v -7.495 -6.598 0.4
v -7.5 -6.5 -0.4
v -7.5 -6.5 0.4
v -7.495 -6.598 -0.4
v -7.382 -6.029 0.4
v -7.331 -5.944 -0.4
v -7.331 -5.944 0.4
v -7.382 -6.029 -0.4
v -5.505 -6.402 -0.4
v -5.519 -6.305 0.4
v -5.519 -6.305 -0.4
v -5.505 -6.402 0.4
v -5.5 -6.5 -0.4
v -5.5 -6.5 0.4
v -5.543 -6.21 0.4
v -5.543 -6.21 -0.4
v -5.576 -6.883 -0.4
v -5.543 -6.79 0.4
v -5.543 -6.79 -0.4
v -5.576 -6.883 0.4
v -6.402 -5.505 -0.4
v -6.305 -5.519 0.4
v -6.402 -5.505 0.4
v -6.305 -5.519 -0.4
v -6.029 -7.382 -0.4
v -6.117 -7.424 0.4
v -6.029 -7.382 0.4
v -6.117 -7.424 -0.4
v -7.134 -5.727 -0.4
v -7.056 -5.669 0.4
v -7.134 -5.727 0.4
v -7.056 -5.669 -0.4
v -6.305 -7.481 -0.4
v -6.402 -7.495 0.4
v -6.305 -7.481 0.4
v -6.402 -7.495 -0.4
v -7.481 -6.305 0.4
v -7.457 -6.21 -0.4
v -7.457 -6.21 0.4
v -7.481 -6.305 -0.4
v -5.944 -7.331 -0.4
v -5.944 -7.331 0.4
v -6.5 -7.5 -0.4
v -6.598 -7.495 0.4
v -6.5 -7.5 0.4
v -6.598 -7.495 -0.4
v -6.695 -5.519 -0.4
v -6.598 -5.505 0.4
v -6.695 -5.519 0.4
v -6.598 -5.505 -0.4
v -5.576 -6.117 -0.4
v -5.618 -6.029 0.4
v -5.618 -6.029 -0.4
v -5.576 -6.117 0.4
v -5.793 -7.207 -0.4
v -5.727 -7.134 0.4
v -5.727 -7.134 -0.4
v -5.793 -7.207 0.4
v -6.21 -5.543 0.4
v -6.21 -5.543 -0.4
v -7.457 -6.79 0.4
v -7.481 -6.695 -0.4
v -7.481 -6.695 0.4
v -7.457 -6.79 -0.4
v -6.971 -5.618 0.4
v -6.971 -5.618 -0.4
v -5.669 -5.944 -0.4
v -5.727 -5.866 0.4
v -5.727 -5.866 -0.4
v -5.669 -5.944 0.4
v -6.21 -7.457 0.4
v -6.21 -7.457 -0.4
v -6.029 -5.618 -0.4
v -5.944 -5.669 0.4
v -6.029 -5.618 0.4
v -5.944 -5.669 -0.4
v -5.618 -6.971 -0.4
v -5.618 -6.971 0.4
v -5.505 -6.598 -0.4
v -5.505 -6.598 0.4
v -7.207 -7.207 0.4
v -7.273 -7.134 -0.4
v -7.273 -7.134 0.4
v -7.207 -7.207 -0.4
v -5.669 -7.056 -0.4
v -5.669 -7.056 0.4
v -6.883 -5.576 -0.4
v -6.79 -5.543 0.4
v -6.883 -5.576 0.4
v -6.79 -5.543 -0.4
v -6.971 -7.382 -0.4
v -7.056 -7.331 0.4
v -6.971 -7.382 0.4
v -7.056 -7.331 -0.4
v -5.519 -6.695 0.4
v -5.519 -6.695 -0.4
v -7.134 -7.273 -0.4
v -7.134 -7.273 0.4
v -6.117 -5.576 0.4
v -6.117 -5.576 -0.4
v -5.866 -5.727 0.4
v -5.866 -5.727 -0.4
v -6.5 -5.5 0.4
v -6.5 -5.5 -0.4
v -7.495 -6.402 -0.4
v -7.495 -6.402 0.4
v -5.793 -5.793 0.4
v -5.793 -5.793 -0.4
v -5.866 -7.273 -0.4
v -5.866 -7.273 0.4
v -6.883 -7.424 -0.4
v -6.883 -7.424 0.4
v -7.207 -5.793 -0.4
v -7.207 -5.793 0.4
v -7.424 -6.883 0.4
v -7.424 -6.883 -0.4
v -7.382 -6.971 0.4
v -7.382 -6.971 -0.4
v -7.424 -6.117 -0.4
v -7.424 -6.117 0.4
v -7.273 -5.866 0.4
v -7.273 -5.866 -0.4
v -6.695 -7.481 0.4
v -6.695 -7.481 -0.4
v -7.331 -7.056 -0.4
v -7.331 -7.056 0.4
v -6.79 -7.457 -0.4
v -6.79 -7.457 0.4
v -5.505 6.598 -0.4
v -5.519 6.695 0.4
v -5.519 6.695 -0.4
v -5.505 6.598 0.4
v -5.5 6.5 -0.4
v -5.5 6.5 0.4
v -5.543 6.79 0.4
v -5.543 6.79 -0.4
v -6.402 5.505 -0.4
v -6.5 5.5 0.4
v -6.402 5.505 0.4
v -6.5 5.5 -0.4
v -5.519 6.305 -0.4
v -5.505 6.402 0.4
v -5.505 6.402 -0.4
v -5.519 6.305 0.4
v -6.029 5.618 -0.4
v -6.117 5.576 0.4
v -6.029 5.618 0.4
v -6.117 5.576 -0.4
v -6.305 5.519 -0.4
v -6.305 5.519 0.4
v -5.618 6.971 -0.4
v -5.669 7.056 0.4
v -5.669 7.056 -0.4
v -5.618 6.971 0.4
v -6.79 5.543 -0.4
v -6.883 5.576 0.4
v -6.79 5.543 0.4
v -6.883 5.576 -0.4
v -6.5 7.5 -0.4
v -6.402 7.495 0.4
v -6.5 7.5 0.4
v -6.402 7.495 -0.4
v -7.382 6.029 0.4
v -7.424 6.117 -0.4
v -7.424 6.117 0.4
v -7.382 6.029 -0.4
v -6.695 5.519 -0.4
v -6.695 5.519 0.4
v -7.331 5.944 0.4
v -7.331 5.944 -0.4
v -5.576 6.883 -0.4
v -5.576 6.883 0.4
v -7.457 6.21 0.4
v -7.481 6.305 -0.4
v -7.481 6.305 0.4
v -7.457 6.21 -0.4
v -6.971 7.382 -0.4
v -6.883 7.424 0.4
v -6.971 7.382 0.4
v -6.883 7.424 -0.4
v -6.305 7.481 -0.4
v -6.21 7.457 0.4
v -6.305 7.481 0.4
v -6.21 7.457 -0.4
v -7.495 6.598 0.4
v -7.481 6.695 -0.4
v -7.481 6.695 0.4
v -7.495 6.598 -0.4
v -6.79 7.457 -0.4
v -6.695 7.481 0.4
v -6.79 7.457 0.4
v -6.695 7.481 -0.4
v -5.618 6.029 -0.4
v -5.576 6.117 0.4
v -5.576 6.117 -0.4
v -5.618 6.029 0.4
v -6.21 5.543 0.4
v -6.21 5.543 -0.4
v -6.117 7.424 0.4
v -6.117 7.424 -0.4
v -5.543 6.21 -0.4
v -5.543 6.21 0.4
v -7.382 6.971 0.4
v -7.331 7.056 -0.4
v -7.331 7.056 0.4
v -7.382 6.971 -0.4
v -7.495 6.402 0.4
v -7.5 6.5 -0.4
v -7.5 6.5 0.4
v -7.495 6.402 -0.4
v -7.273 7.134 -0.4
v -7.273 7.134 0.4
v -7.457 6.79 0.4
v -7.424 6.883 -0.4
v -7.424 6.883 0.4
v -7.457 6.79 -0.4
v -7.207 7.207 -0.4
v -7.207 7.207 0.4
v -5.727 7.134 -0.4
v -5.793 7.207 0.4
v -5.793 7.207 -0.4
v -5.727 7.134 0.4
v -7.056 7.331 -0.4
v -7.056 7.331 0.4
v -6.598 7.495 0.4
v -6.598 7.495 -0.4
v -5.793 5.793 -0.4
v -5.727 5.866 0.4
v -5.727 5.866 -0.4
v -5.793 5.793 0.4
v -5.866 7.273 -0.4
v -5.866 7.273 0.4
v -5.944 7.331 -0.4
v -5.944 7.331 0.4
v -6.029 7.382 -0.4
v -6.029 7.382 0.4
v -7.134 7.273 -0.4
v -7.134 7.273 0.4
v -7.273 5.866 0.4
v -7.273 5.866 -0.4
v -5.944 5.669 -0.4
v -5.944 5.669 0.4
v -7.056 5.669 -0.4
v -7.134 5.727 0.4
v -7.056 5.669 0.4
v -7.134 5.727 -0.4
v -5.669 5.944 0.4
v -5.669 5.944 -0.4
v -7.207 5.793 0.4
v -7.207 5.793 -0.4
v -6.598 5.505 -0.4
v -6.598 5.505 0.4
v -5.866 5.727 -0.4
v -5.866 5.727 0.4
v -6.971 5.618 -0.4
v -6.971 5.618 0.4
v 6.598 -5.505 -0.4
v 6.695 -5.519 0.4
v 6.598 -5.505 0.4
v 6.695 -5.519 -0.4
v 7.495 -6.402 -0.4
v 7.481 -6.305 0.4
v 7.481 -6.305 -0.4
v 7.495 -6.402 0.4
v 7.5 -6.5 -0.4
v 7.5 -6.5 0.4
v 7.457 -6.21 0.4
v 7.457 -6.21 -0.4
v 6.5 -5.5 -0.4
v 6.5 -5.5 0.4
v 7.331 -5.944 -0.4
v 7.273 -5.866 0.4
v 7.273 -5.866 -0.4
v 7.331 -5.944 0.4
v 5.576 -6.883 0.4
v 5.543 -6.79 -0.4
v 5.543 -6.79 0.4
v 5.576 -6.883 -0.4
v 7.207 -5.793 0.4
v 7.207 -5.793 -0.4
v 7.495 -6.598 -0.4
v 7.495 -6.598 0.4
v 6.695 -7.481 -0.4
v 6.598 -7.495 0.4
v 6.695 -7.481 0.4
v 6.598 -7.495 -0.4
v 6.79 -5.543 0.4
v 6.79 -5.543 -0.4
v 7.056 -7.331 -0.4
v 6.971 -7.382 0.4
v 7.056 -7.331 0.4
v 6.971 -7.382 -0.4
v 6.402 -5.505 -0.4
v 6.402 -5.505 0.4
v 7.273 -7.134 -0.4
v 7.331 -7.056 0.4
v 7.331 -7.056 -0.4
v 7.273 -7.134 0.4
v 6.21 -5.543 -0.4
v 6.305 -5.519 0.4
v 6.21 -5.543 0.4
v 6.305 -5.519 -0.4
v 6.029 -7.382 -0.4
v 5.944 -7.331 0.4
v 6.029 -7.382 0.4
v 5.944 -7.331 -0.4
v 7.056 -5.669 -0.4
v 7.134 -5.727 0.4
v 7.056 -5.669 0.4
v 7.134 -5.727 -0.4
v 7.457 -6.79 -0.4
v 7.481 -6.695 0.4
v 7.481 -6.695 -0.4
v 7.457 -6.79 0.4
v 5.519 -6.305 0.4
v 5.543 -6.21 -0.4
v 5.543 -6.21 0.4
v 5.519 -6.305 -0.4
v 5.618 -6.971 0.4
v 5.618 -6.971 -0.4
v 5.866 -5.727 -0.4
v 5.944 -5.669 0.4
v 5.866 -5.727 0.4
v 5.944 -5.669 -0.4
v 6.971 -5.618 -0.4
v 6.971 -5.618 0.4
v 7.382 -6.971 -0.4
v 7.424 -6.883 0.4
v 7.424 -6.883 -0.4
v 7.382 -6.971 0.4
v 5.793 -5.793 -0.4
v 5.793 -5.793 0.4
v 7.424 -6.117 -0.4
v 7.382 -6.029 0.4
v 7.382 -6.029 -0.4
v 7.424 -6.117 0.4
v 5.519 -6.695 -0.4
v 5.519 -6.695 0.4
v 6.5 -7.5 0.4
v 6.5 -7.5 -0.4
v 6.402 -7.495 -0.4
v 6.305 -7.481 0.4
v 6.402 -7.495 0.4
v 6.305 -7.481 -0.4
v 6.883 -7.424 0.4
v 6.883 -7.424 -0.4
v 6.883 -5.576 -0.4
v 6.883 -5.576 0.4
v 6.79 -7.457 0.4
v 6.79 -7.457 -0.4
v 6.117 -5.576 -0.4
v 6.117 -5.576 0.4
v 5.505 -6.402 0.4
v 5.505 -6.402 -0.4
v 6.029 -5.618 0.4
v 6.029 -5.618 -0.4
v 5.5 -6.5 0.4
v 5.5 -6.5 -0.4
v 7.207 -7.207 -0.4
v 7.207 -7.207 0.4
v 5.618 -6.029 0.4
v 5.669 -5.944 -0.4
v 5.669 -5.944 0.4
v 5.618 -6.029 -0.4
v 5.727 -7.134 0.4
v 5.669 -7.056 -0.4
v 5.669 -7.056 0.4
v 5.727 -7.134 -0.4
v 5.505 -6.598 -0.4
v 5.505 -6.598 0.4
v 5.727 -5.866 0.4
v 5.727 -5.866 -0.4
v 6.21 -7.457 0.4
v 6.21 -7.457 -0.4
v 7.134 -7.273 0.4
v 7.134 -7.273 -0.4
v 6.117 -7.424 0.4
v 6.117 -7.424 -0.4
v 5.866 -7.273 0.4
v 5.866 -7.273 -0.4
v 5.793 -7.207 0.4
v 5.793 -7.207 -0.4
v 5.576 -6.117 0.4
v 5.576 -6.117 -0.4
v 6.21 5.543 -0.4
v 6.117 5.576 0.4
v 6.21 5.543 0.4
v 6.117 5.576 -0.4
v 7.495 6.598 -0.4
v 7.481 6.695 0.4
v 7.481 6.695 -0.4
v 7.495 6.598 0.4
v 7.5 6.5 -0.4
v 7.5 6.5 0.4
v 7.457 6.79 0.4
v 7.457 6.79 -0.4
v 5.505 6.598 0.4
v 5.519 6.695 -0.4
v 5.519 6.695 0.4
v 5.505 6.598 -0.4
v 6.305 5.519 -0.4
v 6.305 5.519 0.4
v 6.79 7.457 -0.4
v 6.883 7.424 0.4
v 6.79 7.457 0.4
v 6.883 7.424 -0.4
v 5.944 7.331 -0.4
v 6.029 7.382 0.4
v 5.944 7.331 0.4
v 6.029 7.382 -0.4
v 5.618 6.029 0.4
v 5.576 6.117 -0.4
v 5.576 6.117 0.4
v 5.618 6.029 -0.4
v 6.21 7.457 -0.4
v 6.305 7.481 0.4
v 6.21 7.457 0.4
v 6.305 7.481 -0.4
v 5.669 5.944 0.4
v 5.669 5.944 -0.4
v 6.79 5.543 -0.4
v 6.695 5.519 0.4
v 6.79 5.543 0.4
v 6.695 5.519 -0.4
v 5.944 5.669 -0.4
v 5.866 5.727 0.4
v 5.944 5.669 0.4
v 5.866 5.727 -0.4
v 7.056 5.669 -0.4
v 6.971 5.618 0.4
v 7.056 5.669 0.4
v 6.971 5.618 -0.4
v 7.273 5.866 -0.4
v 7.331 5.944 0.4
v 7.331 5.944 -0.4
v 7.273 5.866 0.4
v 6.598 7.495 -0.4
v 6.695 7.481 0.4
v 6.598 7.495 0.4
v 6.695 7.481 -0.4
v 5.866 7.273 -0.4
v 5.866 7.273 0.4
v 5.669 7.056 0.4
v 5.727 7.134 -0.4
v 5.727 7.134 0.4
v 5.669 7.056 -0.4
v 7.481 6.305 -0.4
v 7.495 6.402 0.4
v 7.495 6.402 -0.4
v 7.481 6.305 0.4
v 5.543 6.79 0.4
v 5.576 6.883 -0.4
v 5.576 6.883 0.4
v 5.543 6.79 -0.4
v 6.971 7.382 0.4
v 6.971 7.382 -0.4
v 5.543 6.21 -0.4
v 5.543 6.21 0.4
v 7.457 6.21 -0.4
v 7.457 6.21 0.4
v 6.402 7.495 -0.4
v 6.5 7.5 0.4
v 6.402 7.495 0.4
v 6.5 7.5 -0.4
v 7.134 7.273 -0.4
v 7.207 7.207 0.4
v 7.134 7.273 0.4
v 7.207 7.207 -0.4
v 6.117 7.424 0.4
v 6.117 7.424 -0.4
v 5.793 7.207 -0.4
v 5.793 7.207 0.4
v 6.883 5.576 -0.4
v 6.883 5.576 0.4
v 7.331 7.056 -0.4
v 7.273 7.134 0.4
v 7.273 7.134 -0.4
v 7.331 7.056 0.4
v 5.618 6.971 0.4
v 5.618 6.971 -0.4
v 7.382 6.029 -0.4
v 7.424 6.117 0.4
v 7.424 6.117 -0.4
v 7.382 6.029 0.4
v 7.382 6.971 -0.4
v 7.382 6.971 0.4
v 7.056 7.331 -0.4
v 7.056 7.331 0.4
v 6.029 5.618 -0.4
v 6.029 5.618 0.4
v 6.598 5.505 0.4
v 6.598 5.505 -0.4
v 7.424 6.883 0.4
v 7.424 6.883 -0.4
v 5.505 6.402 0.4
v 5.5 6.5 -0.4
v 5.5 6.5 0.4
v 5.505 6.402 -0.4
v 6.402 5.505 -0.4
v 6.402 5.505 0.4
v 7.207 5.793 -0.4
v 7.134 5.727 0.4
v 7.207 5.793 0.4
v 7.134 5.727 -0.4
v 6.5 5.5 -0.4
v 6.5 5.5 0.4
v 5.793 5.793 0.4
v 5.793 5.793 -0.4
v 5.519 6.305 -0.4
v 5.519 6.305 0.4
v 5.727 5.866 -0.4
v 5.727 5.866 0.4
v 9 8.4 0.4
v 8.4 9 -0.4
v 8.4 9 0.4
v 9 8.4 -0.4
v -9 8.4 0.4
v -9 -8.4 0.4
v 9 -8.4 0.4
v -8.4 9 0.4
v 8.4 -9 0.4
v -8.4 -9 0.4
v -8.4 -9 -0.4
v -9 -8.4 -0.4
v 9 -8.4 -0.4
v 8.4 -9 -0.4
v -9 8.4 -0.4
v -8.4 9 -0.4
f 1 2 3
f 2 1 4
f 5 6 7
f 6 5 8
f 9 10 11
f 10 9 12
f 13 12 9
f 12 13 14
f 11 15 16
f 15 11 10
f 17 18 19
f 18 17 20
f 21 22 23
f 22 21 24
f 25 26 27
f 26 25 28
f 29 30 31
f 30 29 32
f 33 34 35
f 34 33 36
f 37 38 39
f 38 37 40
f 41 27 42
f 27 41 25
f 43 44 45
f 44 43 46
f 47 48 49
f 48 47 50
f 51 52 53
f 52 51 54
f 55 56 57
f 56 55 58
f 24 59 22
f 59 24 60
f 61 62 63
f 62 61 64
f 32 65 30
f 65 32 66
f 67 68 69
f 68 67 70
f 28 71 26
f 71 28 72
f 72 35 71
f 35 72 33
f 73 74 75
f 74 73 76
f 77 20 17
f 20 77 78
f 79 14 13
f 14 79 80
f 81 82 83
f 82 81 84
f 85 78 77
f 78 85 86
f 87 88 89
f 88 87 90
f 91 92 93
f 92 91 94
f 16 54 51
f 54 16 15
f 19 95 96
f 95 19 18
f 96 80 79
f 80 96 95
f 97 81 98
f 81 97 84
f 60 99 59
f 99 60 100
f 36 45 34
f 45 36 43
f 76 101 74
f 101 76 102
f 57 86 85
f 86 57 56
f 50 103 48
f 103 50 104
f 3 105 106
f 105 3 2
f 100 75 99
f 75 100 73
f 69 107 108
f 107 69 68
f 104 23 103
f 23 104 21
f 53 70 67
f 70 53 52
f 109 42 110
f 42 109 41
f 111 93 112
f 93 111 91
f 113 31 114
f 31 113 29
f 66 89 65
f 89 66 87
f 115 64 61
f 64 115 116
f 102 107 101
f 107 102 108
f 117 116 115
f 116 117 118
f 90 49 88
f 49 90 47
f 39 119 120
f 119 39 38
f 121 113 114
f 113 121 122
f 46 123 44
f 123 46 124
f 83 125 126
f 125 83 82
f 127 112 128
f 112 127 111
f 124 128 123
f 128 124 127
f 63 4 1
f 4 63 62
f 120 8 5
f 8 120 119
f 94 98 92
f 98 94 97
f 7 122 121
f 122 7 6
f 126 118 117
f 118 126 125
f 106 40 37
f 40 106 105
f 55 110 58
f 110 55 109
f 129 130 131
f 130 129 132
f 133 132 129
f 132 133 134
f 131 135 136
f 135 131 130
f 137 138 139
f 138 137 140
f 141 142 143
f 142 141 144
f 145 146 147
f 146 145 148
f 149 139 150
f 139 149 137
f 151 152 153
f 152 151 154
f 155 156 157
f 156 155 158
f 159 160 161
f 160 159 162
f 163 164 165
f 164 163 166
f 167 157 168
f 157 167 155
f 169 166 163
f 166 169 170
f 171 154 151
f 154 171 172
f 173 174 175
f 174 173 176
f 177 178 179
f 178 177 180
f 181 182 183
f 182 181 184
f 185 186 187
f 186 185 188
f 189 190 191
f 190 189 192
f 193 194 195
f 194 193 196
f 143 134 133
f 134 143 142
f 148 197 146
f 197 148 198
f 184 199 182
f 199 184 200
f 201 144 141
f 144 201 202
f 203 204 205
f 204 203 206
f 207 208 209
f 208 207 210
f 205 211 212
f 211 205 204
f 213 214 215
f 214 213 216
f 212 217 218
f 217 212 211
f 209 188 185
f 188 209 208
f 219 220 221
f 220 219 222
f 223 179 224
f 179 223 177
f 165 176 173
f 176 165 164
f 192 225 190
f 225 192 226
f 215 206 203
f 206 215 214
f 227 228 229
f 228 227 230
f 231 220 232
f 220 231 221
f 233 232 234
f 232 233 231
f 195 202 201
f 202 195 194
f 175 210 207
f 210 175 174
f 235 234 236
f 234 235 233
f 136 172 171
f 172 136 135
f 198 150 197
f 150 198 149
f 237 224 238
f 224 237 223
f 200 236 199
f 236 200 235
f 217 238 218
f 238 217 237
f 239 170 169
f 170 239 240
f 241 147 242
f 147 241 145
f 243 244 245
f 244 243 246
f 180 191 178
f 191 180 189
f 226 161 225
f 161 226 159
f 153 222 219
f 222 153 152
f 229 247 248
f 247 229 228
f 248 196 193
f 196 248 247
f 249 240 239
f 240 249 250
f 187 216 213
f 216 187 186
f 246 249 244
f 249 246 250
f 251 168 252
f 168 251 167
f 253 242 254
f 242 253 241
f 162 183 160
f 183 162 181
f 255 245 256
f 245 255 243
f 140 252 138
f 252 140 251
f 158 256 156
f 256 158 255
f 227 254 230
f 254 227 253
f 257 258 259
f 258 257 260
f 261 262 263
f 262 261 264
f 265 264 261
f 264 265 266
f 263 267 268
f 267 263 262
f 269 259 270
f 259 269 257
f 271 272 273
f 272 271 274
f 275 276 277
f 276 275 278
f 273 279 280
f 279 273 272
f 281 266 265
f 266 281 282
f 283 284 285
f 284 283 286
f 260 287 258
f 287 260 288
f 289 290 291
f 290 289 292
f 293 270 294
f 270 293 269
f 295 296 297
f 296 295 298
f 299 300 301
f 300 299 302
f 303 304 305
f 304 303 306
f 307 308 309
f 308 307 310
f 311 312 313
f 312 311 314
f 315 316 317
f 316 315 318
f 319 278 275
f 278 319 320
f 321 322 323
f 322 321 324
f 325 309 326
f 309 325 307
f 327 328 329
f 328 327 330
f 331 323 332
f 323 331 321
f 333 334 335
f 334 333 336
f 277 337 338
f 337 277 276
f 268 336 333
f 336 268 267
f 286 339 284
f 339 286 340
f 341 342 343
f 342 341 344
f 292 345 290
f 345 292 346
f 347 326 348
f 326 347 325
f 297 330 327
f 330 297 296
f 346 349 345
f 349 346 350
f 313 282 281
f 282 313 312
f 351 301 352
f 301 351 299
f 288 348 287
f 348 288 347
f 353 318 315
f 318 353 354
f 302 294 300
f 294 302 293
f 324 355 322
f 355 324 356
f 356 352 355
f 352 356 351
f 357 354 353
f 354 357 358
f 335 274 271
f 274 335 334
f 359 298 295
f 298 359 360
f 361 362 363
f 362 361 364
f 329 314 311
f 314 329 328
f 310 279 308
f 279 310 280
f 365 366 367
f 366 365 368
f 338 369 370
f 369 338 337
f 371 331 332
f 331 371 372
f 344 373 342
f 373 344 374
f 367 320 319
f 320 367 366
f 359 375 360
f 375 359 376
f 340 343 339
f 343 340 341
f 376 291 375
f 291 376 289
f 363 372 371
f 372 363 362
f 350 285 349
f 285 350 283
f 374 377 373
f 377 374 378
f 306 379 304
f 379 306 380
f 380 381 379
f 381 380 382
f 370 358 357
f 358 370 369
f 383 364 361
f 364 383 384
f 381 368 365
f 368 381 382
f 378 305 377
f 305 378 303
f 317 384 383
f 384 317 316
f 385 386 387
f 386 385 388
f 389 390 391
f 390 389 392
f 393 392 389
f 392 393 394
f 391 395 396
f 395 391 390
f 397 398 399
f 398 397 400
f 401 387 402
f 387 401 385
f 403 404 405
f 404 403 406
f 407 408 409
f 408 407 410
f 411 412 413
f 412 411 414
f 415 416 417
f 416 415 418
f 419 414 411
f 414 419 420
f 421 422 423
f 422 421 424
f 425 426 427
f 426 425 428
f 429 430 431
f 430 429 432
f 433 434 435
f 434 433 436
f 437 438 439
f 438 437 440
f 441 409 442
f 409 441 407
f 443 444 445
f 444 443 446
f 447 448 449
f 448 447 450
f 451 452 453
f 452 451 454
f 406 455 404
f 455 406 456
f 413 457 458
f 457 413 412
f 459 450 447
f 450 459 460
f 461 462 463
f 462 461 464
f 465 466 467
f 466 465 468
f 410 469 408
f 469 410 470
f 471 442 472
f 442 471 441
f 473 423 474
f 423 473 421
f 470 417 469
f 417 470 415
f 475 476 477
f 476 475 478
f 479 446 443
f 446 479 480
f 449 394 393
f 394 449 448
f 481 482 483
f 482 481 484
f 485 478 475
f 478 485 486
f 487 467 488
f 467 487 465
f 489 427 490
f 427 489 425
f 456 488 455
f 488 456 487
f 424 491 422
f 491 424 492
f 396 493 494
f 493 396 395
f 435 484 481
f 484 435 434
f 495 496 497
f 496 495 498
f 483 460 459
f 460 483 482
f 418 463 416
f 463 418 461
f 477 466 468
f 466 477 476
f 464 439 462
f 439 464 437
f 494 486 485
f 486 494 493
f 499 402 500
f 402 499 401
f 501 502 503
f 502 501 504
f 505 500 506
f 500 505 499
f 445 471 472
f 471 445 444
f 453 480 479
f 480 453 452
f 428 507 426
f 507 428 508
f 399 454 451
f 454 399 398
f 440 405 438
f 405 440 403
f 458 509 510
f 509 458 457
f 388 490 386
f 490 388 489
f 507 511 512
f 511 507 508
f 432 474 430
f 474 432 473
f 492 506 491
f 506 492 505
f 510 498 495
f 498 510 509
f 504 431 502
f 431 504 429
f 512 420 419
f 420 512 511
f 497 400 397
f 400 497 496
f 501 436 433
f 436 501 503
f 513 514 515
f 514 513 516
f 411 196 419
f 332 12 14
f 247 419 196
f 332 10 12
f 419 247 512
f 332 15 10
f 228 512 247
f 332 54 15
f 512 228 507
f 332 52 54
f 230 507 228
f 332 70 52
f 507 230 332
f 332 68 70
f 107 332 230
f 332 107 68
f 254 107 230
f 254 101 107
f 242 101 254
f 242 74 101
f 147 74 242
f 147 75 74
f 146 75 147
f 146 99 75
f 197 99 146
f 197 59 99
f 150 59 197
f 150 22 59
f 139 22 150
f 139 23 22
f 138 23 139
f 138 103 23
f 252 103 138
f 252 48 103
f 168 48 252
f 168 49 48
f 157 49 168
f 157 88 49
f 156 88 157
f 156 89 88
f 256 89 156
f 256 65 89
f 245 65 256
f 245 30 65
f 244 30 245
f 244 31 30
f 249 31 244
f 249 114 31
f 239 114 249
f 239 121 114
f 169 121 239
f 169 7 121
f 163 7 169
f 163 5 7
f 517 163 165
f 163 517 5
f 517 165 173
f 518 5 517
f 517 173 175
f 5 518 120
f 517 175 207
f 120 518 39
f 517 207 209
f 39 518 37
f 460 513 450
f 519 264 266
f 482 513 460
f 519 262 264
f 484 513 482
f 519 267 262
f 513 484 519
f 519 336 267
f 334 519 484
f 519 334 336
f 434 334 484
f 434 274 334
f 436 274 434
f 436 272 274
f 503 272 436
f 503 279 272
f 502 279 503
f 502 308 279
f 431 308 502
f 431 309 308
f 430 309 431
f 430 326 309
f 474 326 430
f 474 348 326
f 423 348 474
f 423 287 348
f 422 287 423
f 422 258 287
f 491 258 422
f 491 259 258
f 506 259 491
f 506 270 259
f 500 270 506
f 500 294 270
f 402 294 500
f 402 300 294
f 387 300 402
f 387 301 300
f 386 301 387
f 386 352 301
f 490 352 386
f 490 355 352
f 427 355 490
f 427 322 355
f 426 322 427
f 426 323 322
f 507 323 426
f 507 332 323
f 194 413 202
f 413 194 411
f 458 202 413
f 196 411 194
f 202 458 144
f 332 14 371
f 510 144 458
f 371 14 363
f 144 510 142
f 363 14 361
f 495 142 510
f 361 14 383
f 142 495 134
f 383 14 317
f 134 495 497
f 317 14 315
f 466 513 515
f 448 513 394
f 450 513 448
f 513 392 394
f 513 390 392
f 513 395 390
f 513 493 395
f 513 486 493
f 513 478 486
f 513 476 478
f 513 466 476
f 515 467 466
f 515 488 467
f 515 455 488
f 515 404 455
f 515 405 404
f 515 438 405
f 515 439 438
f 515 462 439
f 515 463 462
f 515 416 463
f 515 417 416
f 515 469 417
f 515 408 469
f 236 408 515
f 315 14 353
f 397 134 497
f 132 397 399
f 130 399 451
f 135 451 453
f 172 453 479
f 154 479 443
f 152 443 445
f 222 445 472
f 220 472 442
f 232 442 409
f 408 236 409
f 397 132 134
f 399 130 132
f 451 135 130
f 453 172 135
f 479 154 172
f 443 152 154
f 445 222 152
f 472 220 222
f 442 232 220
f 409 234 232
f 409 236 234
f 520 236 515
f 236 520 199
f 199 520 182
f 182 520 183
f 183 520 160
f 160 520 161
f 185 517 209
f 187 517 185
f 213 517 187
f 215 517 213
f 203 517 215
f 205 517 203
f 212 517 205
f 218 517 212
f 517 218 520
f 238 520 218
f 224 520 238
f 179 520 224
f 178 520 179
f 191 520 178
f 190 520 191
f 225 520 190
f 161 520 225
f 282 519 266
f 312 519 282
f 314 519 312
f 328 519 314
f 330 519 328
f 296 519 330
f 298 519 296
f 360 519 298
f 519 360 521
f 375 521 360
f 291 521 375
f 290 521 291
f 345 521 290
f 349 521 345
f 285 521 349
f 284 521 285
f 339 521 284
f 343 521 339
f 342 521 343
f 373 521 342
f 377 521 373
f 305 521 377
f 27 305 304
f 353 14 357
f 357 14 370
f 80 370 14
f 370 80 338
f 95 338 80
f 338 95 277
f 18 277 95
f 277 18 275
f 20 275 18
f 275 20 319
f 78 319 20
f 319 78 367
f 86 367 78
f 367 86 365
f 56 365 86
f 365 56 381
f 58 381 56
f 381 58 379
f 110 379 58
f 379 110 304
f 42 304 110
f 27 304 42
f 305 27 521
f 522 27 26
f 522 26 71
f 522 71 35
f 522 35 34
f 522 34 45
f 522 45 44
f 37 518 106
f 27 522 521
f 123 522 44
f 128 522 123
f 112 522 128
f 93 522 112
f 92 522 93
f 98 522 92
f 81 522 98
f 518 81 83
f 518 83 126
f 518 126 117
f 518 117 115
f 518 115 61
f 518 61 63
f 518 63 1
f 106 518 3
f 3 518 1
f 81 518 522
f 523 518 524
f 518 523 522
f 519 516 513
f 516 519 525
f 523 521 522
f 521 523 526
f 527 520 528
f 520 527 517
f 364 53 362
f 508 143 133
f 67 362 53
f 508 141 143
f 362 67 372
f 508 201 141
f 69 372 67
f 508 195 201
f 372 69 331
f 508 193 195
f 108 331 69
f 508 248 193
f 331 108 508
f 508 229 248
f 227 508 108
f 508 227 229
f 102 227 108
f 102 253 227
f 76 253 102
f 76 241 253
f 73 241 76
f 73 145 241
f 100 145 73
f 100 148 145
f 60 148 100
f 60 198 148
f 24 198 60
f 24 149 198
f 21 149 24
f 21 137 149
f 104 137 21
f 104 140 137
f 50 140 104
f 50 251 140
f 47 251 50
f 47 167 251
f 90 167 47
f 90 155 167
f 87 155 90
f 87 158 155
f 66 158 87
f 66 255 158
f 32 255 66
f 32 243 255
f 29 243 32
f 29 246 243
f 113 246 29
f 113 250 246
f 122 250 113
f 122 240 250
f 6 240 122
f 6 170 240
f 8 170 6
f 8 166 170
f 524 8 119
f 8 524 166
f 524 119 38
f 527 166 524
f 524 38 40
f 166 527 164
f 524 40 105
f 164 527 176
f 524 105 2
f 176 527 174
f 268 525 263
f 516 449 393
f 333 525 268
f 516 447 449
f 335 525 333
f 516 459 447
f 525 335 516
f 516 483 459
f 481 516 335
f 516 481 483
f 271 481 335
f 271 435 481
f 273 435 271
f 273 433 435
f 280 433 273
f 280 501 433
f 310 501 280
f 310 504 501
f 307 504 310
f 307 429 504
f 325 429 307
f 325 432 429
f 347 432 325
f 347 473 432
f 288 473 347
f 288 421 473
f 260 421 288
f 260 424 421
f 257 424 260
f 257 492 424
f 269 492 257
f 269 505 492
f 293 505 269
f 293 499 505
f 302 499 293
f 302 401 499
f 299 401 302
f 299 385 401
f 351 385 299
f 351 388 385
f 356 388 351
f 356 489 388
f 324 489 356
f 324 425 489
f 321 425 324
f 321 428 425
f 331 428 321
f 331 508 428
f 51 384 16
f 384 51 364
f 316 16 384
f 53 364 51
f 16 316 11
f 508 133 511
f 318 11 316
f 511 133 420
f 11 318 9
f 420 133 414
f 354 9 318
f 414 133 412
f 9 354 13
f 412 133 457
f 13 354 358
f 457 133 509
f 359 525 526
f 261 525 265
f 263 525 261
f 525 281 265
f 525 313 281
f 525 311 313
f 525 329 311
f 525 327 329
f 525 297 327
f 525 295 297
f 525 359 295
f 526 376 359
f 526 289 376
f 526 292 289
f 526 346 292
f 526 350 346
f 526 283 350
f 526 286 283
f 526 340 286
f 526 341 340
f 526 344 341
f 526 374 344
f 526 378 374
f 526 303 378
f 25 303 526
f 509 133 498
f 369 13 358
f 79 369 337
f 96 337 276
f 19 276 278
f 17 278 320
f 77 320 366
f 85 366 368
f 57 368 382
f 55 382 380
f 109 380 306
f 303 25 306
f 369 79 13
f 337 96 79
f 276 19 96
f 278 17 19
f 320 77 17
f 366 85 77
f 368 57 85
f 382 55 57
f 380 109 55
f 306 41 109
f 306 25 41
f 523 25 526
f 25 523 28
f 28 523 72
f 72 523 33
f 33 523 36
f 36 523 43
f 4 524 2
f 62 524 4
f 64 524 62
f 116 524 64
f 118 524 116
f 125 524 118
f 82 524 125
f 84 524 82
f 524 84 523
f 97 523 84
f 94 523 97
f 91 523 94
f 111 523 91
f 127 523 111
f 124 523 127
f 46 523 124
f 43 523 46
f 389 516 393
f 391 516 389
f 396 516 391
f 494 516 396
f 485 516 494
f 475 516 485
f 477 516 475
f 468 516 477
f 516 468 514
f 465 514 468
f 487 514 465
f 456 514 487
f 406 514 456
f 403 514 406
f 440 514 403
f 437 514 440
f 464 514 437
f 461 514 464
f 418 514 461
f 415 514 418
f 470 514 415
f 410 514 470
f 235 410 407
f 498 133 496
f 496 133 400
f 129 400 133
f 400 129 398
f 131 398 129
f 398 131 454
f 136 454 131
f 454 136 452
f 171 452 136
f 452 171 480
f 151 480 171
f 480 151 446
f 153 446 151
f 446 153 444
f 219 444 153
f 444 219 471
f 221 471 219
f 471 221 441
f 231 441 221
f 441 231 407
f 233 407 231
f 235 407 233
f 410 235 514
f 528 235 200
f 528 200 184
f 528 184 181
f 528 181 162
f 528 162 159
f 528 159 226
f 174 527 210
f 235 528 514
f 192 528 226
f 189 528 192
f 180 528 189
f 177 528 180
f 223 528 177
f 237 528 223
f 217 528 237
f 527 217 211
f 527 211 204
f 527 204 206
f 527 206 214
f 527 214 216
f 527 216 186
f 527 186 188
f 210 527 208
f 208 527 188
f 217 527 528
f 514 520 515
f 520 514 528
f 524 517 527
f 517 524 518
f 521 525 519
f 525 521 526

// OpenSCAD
$fn = 64;

// Target: Printed circuit board 18.0mm x 18.0mm x 0.8mm (single connected solid)

// Parameters
pcb_L = 18.0;
pcb_W = 18.0;
pcb_T = 0.8;

hole_d = 2.0;
hole_edge_margin = 2.5;

corner_chamfer = 0.6;   // small corner bevel (visual), kept modest
eps = 0.02;             // tiny overlap to guarantee manifold connectivity

// 2D outline with chamfered corners (keeps exact overall L/W)
module pcb_outline_2d(L, W, c) {
    // Clamp chamfer to safe range
    c2 = min(c, min(L, W)/2 - 0.001);

    polygon(points=[
        [ L/2 - c2,  W/2],
        [-L/2 + c2,  W/2],
        [-L/2,  W/2 - c2],
        [-L/2, -W/2 + c2],
        [-L/2 + c2, -W/2],
        [ L/2 - c2, -W/2],
        [ L/2, -W/2 + c2],
        [ L/2,  W/2 - c2]
    ]);
}

// Mounting holes (through the full PCB thickness)
module mounting_holes_3d() {
    hole_h = pcb_T + 2*eps;
    for (x = [-1, 1], y = [-1, 1]) {
        translate([x*(pcb_L/2 - hole_edge_margin), y*(pcb_W/2 - hole_edge_margin), 0])
            cylinder(h=hole_h, r=hole_d/2, center=true);
    }
}

// Final PCB (single solid)
module pcb_final() {
    difference() {
        linear_extrude(height=pcb_T, center=true)
            pcb_outline_2d(pcb_L, pcb_W, corner_chamfer);

        mounting_holes_3d();
    }
}

pcb_final();
